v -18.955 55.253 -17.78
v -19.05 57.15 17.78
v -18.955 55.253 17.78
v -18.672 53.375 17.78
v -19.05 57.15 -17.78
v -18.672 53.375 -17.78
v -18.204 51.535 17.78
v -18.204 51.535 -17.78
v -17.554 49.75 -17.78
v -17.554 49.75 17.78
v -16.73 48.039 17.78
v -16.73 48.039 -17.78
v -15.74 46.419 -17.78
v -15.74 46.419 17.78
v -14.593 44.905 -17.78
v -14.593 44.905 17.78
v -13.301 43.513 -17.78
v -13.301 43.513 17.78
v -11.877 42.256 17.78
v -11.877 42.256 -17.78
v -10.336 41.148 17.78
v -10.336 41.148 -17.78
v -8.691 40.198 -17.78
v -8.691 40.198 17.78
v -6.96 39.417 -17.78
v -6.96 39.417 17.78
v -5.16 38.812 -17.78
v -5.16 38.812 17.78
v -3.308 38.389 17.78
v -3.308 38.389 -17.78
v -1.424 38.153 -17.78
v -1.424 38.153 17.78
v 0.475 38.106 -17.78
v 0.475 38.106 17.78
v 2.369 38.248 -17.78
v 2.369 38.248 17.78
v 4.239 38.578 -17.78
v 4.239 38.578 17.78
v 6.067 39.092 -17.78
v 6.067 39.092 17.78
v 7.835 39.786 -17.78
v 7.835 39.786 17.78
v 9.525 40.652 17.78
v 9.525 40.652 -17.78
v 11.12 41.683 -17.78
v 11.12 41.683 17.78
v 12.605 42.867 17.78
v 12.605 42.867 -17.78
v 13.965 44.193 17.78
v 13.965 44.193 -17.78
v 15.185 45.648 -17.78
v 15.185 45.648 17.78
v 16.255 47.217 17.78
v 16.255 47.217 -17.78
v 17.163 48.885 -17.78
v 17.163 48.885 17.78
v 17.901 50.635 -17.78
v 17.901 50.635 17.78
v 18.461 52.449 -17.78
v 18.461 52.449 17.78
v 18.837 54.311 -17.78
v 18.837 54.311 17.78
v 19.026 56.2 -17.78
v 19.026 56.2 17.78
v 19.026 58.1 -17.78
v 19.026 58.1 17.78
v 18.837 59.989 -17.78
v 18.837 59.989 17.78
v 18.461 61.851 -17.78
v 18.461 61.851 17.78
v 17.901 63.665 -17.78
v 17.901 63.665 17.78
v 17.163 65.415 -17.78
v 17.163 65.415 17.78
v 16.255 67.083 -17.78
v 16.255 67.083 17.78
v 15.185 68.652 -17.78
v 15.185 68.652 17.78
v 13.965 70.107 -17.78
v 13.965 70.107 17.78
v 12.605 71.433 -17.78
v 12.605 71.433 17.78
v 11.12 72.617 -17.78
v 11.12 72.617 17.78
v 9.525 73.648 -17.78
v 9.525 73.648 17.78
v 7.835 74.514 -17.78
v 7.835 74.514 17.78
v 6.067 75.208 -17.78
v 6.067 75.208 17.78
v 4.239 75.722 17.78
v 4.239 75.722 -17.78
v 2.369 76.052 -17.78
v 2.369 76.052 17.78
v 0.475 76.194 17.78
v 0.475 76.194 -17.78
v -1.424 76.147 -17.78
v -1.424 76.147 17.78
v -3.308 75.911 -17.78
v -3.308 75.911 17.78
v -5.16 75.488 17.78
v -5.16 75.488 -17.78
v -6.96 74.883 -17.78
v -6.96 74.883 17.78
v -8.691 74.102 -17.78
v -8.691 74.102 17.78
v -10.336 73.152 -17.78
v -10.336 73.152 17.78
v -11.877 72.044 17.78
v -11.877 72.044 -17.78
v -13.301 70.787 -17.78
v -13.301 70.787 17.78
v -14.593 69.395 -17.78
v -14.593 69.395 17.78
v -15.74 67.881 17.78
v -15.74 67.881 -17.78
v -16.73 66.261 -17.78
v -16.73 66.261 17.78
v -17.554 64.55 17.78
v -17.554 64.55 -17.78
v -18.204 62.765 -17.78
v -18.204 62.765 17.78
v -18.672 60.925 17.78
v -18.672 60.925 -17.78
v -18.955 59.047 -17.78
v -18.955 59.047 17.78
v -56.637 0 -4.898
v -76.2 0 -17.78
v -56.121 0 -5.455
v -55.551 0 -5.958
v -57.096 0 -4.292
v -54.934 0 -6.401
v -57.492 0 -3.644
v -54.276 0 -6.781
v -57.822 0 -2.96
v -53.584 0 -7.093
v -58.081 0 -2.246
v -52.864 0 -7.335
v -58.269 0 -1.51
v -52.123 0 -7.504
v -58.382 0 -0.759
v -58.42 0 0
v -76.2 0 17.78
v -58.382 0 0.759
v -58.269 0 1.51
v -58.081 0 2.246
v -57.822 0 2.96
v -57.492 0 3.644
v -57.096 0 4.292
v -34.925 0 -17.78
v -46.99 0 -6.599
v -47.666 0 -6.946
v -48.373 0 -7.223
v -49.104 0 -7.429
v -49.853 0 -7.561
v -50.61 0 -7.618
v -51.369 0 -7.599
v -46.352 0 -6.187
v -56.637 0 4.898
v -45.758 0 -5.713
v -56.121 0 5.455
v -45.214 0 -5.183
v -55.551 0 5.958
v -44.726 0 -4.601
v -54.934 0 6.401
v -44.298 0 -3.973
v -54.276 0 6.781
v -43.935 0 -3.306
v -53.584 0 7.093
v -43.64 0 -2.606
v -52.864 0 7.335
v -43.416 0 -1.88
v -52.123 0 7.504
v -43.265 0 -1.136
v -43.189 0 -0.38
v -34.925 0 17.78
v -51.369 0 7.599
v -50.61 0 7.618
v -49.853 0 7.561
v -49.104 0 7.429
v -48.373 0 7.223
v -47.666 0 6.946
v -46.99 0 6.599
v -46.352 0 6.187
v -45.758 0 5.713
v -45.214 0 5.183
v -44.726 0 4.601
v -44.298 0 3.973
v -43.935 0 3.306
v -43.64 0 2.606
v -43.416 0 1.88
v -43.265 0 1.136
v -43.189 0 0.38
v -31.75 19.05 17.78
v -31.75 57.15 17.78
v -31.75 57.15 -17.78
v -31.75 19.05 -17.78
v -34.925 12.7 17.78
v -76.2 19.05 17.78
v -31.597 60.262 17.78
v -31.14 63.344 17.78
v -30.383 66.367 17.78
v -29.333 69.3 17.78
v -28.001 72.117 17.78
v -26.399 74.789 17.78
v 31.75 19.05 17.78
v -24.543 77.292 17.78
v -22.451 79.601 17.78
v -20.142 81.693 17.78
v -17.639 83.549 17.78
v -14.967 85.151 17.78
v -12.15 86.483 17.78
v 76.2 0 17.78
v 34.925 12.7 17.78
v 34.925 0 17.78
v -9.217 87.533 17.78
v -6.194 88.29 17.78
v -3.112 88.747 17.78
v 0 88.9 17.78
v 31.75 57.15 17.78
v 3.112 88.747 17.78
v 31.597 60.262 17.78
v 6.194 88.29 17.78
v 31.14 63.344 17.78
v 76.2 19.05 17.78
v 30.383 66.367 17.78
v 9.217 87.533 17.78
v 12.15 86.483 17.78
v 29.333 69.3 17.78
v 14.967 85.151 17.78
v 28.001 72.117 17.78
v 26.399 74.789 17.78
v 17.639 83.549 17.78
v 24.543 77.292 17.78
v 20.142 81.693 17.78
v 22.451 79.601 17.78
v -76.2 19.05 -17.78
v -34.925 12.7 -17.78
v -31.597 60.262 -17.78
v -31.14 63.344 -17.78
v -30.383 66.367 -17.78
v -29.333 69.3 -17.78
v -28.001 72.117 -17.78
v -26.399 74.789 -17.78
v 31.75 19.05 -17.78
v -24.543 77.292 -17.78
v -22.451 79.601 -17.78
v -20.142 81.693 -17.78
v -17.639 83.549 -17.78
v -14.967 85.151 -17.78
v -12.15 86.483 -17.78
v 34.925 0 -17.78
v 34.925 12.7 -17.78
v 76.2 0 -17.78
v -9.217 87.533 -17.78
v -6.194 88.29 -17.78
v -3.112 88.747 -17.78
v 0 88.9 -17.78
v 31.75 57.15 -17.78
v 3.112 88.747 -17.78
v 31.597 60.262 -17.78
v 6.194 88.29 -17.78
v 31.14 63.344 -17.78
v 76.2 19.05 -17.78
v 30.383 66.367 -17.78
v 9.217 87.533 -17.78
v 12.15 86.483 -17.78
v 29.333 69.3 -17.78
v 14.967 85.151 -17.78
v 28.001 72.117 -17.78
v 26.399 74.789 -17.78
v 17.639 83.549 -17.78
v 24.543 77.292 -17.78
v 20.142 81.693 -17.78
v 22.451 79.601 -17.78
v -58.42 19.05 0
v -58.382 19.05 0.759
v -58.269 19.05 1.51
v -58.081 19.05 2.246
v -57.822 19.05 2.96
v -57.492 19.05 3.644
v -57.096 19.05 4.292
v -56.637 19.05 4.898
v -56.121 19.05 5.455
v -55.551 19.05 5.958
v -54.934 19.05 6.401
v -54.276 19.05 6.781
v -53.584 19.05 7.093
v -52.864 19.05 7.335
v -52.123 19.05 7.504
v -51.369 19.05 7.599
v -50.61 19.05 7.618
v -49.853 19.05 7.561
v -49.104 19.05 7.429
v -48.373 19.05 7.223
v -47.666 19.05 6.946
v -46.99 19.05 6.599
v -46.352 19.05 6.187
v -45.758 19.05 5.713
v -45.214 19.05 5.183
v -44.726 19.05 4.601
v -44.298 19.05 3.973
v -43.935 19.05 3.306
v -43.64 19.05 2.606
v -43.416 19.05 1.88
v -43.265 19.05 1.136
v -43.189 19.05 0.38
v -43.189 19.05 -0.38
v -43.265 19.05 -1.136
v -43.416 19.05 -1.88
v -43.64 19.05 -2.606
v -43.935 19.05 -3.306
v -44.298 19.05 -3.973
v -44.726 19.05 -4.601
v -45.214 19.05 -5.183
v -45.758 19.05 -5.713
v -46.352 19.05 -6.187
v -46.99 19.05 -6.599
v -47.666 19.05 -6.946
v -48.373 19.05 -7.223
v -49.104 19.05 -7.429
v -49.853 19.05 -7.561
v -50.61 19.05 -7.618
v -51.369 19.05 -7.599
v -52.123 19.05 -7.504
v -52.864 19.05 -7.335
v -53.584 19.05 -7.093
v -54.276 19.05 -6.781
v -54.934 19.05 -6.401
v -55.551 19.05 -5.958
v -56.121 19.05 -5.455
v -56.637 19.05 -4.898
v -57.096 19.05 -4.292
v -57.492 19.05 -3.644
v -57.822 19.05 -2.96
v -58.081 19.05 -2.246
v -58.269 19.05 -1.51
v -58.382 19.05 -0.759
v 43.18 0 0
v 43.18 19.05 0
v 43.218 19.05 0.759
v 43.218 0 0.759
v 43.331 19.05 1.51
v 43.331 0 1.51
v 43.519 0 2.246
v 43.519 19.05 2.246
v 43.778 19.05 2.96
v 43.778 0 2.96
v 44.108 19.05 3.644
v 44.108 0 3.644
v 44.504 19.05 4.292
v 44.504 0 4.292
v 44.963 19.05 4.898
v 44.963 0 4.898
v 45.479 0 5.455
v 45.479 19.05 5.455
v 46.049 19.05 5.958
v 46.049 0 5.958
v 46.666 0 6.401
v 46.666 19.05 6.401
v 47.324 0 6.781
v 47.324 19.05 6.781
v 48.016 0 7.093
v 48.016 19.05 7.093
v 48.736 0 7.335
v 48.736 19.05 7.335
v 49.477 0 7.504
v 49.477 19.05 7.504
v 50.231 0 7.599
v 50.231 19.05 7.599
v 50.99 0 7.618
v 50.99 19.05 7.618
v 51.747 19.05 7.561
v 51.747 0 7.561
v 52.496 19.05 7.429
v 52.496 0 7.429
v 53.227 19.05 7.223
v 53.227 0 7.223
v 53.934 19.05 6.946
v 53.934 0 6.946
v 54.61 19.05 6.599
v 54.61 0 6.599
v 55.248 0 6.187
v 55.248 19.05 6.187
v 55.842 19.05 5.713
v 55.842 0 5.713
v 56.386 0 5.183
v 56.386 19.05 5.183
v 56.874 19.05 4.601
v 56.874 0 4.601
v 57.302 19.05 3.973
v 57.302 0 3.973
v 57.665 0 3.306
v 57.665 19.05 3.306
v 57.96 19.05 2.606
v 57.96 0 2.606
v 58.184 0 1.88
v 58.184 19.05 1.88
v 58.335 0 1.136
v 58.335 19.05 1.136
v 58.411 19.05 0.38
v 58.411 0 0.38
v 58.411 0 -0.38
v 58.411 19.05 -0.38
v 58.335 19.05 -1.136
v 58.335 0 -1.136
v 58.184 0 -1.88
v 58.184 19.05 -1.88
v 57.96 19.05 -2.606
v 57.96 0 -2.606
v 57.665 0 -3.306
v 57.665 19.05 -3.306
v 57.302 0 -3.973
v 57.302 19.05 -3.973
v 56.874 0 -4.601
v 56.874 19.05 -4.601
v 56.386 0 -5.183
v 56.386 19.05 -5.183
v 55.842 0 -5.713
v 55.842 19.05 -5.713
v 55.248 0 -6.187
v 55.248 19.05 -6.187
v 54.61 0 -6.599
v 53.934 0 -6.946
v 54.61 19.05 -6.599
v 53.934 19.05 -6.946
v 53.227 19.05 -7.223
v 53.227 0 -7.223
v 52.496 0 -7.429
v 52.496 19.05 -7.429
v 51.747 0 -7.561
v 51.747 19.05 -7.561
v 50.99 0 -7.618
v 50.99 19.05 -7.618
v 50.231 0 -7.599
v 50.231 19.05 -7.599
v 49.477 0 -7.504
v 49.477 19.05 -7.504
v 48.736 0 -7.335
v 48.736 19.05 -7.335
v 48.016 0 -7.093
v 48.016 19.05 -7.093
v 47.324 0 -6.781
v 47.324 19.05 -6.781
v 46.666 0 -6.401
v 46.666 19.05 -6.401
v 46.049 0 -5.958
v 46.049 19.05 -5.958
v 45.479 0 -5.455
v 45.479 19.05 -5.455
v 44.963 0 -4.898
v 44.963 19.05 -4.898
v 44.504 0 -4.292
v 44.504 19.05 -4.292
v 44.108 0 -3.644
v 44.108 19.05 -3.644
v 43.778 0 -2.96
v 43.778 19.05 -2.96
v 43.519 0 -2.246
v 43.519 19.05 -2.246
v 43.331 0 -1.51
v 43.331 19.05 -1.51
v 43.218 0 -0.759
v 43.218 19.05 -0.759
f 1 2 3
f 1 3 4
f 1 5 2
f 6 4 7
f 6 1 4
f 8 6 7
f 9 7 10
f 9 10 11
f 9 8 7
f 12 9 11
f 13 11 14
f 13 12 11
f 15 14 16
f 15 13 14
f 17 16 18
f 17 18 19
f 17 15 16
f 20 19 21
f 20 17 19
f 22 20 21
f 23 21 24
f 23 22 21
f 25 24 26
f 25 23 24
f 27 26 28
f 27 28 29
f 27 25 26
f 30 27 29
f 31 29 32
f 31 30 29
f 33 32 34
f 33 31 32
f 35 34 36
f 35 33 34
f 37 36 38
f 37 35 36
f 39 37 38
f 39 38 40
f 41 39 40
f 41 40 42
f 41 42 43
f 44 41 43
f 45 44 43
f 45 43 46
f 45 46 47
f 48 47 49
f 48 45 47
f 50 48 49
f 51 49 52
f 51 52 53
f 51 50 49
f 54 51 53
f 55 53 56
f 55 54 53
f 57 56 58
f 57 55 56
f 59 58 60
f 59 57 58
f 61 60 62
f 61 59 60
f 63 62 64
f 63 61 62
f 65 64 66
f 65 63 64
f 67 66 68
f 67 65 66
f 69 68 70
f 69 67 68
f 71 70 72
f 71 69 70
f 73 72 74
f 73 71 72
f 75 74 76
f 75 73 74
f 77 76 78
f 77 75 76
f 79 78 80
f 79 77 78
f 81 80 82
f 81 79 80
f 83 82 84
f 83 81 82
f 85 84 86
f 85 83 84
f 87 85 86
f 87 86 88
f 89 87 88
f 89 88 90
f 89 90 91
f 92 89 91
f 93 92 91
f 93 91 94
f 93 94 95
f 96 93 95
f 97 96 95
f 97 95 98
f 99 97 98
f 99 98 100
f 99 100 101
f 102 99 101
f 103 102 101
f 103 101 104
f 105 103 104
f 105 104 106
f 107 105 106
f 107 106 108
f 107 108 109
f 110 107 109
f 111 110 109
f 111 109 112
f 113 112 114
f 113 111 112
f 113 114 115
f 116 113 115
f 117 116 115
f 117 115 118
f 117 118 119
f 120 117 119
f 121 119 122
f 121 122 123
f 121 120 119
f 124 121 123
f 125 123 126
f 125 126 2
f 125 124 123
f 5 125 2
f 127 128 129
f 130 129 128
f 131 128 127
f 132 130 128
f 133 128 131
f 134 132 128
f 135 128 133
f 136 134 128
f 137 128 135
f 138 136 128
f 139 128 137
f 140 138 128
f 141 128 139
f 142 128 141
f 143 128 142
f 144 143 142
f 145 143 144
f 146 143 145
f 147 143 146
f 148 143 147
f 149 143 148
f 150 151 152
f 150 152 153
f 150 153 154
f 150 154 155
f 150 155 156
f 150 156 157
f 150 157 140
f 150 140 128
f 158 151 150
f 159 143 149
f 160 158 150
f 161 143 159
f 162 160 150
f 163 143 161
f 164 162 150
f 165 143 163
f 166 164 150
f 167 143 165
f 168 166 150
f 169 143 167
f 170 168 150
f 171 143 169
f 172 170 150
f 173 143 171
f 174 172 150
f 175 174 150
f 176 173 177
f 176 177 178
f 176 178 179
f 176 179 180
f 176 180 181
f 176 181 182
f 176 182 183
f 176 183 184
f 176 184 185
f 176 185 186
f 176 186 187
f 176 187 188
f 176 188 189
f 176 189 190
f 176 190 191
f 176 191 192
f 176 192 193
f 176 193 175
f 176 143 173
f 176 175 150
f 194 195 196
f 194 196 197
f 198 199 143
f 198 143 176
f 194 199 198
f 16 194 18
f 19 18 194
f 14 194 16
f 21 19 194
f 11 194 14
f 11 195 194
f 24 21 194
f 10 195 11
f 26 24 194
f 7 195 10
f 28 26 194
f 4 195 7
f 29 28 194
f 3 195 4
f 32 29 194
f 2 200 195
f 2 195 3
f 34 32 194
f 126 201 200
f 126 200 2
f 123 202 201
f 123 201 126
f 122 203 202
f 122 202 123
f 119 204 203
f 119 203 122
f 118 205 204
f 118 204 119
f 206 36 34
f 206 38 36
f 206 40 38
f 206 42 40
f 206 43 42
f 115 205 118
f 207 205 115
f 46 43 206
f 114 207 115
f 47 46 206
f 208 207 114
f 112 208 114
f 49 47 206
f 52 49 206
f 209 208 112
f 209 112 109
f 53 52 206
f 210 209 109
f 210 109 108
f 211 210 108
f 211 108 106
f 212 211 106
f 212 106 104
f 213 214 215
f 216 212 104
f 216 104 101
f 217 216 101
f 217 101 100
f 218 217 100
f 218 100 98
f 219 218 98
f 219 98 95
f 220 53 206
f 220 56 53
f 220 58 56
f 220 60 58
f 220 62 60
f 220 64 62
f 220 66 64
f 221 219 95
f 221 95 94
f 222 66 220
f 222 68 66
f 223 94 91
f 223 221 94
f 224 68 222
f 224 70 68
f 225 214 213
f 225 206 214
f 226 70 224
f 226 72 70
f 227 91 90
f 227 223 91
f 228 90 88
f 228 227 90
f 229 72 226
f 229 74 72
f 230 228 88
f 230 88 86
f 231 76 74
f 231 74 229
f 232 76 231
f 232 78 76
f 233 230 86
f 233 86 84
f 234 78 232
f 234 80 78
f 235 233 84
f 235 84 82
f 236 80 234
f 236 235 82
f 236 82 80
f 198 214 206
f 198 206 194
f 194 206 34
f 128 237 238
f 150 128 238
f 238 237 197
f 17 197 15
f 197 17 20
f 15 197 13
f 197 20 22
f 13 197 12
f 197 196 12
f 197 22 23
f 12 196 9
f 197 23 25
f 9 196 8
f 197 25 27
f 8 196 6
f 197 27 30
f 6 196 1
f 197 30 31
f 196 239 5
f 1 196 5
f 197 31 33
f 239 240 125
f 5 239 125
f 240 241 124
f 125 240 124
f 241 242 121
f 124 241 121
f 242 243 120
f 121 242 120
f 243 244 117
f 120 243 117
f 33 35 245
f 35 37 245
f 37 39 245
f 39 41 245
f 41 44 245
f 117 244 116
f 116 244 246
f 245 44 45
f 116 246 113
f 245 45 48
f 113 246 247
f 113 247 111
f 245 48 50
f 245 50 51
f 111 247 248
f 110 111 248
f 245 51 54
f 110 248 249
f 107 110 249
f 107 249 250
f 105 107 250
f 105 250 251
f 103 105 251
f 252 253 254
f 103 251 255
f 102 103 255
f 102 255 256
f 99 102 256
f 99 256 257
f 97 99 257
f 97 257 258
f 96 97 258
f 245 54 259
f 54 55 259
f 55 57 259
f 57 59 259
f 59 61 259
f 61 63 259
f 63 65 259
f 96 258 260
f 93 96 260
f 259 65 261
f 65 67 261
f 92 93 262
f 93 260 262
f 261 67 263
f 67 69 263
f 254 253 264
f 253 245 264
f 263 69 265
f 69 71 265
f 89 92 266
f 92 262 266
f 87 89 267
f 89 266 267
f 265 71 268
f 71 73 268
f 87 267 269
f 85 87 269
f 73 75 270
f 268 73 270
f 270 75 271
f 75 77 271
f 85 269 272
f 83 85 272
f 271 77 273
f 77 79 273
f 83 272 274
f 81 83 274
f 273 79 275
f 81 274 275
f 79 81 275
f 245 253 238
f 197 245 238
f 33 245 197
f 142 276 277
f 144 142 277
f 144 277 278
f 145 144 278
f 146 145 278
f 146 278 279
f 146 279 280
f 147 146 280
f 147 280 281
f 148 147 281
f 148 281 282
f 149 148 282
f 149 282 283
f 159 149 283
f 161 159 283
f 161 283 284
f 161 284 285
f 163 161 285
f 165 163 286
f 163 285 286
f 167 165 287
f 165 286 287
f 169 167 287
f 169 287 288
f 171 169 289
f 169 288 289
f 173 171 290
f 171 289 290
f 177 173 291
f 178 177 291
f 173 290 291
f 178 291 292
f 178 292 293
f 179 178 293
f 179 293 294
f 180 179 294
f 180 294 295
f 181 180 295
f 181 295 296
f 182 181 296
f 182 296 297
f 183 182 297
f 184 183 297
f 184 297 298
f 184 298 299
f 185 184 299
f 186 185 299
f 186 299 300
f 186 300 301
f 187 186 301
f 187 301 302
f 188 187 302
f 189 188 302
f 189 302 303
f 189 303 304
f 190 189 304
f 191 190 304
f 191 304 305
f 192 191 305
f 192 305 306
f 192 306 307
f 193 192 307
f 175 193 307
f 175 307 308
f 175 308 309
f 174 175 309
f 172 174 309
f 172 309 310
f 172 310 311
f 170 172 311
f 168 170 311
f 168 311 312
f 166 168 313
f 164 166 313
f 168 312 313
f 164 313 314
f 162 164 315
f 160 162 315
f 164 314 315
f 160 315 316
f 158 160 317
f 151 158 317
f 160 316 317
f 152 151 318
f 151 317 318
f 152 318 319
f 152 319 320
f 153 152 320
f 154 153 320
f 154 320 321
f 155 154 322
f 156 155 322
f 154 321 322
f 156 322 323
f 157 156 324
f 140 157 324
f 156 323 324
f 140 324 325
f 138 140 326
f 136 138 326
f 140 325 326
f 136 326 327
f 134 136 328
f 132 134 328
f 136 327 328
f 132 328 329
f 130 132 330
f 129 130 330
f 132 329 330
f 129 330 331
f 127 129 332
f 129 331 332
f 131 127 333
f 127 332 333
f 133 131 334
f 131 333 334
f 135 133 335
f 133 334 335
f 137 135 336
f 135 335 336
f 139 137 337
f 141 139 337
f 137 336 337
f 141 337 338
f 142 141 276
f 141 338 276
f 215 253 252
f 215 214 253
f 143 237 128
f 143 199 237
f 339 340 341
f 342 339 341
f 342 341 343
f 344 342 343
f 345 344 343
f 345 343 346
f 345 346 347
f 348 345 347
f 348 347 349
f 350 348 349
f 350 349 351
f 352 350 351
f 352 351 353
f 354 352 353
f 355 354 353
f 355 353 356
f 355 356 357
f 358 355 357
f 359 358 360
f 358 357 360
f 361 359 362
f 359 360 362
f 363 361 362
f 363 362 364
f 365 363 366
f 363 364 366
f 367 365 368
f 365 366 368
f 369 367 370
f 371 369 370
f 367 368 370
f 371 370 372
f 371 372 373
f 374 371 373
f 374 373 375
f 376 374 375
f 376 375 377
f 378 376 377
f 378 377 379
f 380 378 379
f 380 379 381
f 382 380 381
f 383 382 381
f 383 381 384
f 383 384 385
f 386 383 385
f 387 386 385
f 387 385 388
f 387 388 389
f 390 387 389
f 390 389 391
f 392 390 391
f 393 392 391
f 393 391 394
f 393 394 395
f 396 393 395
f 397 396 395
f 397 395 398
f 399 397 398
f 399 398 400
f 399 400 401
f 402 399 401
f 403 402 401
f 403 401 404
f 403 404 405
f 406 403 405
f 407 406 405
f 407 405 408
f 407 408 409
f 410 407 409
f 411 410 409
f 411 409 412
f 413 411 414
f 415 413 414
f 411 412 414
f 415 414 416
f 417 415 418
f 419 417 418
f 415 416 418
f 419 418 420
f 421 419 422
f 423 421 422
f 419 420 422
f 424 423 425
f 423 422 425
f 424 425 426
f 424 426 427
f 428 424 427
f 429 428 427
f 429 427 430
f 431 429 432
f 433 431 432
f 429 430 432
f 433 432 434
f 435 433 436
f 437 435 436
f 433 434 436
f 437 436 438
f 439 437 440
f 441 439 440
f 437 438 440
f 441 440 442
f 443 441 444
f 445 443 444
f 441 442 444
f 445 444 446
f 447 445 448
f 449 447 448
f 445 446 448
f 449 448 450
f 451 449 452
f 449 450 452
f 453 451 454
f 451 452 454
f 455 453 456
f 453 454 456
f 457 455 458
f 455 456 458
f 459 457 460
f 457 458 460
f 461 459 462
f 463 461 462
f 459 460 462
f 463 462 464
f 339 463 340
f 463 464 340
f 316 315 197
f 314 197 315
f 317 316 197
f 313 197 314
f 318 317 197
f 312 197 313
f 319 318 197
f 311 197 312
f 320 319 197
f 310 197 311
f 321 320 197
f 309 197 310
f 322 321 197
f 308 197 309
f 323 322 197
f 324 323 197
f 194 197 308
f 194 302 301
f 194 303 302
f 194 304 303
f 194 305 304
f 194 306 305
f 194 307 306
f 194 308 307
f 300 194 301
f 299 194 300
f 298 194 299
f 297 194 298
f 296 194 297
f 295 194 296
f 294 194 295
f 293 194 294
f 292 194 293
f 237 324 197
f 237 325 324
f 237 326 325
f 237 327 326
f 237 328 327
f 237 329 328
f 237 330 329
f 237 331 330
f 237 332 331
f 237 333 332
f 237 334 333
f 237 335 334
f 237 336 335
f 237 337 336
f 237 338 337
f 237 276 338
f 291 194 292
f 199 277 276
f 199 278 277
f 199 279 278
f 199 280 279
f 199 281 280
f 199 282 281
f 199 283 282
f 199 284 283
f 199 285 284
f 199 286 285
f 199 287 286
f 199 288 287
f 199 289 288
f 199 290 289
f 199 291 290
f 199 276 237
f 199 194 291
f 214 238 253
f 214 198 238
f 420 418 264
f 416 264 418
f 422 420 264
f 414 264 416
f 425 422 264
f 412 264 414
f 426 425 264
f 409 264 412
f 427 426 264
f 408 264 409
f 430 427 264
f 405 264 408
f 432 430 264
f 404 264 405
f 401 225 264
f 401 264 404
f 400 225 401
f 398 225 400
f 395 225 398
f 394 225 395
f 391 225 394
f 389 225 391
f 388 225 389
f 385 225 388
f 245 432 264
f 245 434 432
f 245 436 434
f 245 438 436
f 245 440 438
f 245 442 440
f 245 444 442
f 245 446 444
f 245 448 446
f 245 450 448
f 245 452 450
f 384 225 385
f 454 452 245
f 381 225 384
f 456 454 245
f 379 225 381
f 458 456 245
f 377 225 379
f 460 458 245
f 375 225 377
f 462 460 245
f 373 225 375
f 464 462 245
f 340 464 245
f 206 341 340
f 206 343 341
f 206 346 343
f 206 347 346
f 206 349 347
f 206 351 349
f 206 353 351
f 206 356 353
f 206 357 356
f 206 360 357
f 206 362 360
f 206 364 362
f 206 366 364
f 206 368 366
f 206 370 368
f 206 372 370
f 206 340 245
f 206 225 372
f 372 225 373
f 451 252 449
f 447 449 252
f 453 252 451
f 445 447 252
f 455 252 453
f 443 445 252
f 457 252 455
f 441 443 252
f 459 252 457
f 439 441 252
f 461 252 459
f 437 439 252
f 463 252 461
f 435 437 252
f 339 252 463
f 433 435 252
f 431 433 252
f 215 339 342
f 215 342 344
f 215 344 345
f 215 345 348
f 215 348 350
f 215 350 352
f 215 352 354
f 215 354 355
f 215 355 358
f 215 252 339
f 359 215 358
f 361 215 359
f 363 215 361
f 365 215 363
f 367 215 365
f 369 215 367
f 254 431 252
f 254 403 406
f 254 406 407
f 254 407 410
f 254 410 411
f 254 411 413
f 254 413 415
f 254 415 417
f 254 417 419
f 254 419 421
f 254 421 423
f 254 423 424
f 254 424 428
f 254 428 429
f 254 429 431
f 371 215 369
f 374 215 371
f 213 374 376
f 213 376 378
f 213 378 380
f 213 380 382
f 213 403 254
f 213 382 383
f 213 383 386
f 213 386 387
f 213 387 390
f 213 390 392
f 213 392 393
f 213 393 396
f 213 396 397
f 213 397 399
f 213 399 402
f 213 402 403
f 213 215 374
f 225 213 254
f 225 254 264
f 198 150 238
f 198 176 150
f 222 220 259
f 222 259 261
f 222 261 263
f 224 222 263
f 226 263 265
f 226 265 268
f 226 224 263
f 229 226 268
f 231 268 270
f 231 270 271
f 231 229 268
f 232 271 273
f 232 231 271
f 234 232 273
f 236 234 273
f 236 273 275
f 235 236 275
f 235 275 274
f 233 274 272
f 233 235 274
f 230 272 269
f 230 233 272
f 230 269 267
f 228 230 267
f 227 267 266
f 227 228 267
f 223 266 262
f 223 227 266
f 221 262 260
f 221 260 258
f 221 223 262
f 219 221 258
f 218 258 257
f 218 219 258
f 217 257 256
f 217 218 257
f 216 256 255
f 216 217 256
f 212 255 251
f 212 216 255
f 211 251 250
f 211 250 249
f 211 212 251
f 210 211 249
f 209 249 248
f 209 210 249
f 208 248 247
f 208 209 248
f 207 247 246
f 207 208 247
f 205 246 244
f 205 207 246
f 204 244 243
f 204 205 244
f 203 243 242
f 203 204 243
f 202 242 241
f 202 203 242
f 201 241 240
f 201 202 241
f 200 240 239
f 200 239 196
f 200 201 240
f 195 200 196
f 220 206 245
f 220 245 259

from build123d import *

# Parameters (mm, degrees)
SKETCH2_R           = 19.05
BOSS_EXTRUDE1_DEPTH = 17.78
SKETCH3_R           = 7.62
CUT_EXTRUDE1_DEPTH  = 105.888468861


with BuildPart() as part:
    # Sketch2 → Boss-Extrude1 (new, symmetric)
    with BuildSketch(Plane.XY):
        with BuildLine():
            Line((34.925, 0), (76.2, 0))
            Line((76.2, 0), (76.2, 19.05))
            Line((76.2, 19.05), (31.75, 19.05))
            Line((31.75, 19.05), (31.75, 57.15))
            ThreePointArc((31.75, 57.15), (0, 88.9), (-31.75, 57.15))
            Line((-31.75, 57.15), (-31.75, 19.05))
            Line((-31.75, 19.05), (-76.2, 19.05))
            Line((-76.2, 19.05), (-76.2, 0))
            Line((-76.2, 0), (-34.925, 0))
            Line((-34.925, 0), (-34.925, 12.7))
            Line((-34.925, 12.7), (34.925, 12.7))
            Line((34.925, 12.7), (34.925, 0))
        make_face()
        with Locations(Location((0, 57.15, 0), (0, 0, 180))):
            Circle(SKETCH2_R, mode=Mode.SUBTRACT)
    extrude(amount=BOSS_EXTRUDE1_DEPTH, both=True)

    # Sketch3 → Cut-Extrude1 (cut, through all)
    with BuildSketch(Plane(origin=(0, 19.05, 0), x_dir=(1, 0, 0), z_dir=(0, 1, 0))):
        with Locations(Location((-50.8, 0, 0), (0, 0, 180))):
            Circle(SKETCH3_R)
        with Locations(Location((50.8, 0, 0), (0, 0, 180))):
            Circle(SKETCH3_R)
    extrude(amount=-CUT_EXTRUDE1_DEPTH, mode=Mode.SUBTRACT)


solid = part.part
